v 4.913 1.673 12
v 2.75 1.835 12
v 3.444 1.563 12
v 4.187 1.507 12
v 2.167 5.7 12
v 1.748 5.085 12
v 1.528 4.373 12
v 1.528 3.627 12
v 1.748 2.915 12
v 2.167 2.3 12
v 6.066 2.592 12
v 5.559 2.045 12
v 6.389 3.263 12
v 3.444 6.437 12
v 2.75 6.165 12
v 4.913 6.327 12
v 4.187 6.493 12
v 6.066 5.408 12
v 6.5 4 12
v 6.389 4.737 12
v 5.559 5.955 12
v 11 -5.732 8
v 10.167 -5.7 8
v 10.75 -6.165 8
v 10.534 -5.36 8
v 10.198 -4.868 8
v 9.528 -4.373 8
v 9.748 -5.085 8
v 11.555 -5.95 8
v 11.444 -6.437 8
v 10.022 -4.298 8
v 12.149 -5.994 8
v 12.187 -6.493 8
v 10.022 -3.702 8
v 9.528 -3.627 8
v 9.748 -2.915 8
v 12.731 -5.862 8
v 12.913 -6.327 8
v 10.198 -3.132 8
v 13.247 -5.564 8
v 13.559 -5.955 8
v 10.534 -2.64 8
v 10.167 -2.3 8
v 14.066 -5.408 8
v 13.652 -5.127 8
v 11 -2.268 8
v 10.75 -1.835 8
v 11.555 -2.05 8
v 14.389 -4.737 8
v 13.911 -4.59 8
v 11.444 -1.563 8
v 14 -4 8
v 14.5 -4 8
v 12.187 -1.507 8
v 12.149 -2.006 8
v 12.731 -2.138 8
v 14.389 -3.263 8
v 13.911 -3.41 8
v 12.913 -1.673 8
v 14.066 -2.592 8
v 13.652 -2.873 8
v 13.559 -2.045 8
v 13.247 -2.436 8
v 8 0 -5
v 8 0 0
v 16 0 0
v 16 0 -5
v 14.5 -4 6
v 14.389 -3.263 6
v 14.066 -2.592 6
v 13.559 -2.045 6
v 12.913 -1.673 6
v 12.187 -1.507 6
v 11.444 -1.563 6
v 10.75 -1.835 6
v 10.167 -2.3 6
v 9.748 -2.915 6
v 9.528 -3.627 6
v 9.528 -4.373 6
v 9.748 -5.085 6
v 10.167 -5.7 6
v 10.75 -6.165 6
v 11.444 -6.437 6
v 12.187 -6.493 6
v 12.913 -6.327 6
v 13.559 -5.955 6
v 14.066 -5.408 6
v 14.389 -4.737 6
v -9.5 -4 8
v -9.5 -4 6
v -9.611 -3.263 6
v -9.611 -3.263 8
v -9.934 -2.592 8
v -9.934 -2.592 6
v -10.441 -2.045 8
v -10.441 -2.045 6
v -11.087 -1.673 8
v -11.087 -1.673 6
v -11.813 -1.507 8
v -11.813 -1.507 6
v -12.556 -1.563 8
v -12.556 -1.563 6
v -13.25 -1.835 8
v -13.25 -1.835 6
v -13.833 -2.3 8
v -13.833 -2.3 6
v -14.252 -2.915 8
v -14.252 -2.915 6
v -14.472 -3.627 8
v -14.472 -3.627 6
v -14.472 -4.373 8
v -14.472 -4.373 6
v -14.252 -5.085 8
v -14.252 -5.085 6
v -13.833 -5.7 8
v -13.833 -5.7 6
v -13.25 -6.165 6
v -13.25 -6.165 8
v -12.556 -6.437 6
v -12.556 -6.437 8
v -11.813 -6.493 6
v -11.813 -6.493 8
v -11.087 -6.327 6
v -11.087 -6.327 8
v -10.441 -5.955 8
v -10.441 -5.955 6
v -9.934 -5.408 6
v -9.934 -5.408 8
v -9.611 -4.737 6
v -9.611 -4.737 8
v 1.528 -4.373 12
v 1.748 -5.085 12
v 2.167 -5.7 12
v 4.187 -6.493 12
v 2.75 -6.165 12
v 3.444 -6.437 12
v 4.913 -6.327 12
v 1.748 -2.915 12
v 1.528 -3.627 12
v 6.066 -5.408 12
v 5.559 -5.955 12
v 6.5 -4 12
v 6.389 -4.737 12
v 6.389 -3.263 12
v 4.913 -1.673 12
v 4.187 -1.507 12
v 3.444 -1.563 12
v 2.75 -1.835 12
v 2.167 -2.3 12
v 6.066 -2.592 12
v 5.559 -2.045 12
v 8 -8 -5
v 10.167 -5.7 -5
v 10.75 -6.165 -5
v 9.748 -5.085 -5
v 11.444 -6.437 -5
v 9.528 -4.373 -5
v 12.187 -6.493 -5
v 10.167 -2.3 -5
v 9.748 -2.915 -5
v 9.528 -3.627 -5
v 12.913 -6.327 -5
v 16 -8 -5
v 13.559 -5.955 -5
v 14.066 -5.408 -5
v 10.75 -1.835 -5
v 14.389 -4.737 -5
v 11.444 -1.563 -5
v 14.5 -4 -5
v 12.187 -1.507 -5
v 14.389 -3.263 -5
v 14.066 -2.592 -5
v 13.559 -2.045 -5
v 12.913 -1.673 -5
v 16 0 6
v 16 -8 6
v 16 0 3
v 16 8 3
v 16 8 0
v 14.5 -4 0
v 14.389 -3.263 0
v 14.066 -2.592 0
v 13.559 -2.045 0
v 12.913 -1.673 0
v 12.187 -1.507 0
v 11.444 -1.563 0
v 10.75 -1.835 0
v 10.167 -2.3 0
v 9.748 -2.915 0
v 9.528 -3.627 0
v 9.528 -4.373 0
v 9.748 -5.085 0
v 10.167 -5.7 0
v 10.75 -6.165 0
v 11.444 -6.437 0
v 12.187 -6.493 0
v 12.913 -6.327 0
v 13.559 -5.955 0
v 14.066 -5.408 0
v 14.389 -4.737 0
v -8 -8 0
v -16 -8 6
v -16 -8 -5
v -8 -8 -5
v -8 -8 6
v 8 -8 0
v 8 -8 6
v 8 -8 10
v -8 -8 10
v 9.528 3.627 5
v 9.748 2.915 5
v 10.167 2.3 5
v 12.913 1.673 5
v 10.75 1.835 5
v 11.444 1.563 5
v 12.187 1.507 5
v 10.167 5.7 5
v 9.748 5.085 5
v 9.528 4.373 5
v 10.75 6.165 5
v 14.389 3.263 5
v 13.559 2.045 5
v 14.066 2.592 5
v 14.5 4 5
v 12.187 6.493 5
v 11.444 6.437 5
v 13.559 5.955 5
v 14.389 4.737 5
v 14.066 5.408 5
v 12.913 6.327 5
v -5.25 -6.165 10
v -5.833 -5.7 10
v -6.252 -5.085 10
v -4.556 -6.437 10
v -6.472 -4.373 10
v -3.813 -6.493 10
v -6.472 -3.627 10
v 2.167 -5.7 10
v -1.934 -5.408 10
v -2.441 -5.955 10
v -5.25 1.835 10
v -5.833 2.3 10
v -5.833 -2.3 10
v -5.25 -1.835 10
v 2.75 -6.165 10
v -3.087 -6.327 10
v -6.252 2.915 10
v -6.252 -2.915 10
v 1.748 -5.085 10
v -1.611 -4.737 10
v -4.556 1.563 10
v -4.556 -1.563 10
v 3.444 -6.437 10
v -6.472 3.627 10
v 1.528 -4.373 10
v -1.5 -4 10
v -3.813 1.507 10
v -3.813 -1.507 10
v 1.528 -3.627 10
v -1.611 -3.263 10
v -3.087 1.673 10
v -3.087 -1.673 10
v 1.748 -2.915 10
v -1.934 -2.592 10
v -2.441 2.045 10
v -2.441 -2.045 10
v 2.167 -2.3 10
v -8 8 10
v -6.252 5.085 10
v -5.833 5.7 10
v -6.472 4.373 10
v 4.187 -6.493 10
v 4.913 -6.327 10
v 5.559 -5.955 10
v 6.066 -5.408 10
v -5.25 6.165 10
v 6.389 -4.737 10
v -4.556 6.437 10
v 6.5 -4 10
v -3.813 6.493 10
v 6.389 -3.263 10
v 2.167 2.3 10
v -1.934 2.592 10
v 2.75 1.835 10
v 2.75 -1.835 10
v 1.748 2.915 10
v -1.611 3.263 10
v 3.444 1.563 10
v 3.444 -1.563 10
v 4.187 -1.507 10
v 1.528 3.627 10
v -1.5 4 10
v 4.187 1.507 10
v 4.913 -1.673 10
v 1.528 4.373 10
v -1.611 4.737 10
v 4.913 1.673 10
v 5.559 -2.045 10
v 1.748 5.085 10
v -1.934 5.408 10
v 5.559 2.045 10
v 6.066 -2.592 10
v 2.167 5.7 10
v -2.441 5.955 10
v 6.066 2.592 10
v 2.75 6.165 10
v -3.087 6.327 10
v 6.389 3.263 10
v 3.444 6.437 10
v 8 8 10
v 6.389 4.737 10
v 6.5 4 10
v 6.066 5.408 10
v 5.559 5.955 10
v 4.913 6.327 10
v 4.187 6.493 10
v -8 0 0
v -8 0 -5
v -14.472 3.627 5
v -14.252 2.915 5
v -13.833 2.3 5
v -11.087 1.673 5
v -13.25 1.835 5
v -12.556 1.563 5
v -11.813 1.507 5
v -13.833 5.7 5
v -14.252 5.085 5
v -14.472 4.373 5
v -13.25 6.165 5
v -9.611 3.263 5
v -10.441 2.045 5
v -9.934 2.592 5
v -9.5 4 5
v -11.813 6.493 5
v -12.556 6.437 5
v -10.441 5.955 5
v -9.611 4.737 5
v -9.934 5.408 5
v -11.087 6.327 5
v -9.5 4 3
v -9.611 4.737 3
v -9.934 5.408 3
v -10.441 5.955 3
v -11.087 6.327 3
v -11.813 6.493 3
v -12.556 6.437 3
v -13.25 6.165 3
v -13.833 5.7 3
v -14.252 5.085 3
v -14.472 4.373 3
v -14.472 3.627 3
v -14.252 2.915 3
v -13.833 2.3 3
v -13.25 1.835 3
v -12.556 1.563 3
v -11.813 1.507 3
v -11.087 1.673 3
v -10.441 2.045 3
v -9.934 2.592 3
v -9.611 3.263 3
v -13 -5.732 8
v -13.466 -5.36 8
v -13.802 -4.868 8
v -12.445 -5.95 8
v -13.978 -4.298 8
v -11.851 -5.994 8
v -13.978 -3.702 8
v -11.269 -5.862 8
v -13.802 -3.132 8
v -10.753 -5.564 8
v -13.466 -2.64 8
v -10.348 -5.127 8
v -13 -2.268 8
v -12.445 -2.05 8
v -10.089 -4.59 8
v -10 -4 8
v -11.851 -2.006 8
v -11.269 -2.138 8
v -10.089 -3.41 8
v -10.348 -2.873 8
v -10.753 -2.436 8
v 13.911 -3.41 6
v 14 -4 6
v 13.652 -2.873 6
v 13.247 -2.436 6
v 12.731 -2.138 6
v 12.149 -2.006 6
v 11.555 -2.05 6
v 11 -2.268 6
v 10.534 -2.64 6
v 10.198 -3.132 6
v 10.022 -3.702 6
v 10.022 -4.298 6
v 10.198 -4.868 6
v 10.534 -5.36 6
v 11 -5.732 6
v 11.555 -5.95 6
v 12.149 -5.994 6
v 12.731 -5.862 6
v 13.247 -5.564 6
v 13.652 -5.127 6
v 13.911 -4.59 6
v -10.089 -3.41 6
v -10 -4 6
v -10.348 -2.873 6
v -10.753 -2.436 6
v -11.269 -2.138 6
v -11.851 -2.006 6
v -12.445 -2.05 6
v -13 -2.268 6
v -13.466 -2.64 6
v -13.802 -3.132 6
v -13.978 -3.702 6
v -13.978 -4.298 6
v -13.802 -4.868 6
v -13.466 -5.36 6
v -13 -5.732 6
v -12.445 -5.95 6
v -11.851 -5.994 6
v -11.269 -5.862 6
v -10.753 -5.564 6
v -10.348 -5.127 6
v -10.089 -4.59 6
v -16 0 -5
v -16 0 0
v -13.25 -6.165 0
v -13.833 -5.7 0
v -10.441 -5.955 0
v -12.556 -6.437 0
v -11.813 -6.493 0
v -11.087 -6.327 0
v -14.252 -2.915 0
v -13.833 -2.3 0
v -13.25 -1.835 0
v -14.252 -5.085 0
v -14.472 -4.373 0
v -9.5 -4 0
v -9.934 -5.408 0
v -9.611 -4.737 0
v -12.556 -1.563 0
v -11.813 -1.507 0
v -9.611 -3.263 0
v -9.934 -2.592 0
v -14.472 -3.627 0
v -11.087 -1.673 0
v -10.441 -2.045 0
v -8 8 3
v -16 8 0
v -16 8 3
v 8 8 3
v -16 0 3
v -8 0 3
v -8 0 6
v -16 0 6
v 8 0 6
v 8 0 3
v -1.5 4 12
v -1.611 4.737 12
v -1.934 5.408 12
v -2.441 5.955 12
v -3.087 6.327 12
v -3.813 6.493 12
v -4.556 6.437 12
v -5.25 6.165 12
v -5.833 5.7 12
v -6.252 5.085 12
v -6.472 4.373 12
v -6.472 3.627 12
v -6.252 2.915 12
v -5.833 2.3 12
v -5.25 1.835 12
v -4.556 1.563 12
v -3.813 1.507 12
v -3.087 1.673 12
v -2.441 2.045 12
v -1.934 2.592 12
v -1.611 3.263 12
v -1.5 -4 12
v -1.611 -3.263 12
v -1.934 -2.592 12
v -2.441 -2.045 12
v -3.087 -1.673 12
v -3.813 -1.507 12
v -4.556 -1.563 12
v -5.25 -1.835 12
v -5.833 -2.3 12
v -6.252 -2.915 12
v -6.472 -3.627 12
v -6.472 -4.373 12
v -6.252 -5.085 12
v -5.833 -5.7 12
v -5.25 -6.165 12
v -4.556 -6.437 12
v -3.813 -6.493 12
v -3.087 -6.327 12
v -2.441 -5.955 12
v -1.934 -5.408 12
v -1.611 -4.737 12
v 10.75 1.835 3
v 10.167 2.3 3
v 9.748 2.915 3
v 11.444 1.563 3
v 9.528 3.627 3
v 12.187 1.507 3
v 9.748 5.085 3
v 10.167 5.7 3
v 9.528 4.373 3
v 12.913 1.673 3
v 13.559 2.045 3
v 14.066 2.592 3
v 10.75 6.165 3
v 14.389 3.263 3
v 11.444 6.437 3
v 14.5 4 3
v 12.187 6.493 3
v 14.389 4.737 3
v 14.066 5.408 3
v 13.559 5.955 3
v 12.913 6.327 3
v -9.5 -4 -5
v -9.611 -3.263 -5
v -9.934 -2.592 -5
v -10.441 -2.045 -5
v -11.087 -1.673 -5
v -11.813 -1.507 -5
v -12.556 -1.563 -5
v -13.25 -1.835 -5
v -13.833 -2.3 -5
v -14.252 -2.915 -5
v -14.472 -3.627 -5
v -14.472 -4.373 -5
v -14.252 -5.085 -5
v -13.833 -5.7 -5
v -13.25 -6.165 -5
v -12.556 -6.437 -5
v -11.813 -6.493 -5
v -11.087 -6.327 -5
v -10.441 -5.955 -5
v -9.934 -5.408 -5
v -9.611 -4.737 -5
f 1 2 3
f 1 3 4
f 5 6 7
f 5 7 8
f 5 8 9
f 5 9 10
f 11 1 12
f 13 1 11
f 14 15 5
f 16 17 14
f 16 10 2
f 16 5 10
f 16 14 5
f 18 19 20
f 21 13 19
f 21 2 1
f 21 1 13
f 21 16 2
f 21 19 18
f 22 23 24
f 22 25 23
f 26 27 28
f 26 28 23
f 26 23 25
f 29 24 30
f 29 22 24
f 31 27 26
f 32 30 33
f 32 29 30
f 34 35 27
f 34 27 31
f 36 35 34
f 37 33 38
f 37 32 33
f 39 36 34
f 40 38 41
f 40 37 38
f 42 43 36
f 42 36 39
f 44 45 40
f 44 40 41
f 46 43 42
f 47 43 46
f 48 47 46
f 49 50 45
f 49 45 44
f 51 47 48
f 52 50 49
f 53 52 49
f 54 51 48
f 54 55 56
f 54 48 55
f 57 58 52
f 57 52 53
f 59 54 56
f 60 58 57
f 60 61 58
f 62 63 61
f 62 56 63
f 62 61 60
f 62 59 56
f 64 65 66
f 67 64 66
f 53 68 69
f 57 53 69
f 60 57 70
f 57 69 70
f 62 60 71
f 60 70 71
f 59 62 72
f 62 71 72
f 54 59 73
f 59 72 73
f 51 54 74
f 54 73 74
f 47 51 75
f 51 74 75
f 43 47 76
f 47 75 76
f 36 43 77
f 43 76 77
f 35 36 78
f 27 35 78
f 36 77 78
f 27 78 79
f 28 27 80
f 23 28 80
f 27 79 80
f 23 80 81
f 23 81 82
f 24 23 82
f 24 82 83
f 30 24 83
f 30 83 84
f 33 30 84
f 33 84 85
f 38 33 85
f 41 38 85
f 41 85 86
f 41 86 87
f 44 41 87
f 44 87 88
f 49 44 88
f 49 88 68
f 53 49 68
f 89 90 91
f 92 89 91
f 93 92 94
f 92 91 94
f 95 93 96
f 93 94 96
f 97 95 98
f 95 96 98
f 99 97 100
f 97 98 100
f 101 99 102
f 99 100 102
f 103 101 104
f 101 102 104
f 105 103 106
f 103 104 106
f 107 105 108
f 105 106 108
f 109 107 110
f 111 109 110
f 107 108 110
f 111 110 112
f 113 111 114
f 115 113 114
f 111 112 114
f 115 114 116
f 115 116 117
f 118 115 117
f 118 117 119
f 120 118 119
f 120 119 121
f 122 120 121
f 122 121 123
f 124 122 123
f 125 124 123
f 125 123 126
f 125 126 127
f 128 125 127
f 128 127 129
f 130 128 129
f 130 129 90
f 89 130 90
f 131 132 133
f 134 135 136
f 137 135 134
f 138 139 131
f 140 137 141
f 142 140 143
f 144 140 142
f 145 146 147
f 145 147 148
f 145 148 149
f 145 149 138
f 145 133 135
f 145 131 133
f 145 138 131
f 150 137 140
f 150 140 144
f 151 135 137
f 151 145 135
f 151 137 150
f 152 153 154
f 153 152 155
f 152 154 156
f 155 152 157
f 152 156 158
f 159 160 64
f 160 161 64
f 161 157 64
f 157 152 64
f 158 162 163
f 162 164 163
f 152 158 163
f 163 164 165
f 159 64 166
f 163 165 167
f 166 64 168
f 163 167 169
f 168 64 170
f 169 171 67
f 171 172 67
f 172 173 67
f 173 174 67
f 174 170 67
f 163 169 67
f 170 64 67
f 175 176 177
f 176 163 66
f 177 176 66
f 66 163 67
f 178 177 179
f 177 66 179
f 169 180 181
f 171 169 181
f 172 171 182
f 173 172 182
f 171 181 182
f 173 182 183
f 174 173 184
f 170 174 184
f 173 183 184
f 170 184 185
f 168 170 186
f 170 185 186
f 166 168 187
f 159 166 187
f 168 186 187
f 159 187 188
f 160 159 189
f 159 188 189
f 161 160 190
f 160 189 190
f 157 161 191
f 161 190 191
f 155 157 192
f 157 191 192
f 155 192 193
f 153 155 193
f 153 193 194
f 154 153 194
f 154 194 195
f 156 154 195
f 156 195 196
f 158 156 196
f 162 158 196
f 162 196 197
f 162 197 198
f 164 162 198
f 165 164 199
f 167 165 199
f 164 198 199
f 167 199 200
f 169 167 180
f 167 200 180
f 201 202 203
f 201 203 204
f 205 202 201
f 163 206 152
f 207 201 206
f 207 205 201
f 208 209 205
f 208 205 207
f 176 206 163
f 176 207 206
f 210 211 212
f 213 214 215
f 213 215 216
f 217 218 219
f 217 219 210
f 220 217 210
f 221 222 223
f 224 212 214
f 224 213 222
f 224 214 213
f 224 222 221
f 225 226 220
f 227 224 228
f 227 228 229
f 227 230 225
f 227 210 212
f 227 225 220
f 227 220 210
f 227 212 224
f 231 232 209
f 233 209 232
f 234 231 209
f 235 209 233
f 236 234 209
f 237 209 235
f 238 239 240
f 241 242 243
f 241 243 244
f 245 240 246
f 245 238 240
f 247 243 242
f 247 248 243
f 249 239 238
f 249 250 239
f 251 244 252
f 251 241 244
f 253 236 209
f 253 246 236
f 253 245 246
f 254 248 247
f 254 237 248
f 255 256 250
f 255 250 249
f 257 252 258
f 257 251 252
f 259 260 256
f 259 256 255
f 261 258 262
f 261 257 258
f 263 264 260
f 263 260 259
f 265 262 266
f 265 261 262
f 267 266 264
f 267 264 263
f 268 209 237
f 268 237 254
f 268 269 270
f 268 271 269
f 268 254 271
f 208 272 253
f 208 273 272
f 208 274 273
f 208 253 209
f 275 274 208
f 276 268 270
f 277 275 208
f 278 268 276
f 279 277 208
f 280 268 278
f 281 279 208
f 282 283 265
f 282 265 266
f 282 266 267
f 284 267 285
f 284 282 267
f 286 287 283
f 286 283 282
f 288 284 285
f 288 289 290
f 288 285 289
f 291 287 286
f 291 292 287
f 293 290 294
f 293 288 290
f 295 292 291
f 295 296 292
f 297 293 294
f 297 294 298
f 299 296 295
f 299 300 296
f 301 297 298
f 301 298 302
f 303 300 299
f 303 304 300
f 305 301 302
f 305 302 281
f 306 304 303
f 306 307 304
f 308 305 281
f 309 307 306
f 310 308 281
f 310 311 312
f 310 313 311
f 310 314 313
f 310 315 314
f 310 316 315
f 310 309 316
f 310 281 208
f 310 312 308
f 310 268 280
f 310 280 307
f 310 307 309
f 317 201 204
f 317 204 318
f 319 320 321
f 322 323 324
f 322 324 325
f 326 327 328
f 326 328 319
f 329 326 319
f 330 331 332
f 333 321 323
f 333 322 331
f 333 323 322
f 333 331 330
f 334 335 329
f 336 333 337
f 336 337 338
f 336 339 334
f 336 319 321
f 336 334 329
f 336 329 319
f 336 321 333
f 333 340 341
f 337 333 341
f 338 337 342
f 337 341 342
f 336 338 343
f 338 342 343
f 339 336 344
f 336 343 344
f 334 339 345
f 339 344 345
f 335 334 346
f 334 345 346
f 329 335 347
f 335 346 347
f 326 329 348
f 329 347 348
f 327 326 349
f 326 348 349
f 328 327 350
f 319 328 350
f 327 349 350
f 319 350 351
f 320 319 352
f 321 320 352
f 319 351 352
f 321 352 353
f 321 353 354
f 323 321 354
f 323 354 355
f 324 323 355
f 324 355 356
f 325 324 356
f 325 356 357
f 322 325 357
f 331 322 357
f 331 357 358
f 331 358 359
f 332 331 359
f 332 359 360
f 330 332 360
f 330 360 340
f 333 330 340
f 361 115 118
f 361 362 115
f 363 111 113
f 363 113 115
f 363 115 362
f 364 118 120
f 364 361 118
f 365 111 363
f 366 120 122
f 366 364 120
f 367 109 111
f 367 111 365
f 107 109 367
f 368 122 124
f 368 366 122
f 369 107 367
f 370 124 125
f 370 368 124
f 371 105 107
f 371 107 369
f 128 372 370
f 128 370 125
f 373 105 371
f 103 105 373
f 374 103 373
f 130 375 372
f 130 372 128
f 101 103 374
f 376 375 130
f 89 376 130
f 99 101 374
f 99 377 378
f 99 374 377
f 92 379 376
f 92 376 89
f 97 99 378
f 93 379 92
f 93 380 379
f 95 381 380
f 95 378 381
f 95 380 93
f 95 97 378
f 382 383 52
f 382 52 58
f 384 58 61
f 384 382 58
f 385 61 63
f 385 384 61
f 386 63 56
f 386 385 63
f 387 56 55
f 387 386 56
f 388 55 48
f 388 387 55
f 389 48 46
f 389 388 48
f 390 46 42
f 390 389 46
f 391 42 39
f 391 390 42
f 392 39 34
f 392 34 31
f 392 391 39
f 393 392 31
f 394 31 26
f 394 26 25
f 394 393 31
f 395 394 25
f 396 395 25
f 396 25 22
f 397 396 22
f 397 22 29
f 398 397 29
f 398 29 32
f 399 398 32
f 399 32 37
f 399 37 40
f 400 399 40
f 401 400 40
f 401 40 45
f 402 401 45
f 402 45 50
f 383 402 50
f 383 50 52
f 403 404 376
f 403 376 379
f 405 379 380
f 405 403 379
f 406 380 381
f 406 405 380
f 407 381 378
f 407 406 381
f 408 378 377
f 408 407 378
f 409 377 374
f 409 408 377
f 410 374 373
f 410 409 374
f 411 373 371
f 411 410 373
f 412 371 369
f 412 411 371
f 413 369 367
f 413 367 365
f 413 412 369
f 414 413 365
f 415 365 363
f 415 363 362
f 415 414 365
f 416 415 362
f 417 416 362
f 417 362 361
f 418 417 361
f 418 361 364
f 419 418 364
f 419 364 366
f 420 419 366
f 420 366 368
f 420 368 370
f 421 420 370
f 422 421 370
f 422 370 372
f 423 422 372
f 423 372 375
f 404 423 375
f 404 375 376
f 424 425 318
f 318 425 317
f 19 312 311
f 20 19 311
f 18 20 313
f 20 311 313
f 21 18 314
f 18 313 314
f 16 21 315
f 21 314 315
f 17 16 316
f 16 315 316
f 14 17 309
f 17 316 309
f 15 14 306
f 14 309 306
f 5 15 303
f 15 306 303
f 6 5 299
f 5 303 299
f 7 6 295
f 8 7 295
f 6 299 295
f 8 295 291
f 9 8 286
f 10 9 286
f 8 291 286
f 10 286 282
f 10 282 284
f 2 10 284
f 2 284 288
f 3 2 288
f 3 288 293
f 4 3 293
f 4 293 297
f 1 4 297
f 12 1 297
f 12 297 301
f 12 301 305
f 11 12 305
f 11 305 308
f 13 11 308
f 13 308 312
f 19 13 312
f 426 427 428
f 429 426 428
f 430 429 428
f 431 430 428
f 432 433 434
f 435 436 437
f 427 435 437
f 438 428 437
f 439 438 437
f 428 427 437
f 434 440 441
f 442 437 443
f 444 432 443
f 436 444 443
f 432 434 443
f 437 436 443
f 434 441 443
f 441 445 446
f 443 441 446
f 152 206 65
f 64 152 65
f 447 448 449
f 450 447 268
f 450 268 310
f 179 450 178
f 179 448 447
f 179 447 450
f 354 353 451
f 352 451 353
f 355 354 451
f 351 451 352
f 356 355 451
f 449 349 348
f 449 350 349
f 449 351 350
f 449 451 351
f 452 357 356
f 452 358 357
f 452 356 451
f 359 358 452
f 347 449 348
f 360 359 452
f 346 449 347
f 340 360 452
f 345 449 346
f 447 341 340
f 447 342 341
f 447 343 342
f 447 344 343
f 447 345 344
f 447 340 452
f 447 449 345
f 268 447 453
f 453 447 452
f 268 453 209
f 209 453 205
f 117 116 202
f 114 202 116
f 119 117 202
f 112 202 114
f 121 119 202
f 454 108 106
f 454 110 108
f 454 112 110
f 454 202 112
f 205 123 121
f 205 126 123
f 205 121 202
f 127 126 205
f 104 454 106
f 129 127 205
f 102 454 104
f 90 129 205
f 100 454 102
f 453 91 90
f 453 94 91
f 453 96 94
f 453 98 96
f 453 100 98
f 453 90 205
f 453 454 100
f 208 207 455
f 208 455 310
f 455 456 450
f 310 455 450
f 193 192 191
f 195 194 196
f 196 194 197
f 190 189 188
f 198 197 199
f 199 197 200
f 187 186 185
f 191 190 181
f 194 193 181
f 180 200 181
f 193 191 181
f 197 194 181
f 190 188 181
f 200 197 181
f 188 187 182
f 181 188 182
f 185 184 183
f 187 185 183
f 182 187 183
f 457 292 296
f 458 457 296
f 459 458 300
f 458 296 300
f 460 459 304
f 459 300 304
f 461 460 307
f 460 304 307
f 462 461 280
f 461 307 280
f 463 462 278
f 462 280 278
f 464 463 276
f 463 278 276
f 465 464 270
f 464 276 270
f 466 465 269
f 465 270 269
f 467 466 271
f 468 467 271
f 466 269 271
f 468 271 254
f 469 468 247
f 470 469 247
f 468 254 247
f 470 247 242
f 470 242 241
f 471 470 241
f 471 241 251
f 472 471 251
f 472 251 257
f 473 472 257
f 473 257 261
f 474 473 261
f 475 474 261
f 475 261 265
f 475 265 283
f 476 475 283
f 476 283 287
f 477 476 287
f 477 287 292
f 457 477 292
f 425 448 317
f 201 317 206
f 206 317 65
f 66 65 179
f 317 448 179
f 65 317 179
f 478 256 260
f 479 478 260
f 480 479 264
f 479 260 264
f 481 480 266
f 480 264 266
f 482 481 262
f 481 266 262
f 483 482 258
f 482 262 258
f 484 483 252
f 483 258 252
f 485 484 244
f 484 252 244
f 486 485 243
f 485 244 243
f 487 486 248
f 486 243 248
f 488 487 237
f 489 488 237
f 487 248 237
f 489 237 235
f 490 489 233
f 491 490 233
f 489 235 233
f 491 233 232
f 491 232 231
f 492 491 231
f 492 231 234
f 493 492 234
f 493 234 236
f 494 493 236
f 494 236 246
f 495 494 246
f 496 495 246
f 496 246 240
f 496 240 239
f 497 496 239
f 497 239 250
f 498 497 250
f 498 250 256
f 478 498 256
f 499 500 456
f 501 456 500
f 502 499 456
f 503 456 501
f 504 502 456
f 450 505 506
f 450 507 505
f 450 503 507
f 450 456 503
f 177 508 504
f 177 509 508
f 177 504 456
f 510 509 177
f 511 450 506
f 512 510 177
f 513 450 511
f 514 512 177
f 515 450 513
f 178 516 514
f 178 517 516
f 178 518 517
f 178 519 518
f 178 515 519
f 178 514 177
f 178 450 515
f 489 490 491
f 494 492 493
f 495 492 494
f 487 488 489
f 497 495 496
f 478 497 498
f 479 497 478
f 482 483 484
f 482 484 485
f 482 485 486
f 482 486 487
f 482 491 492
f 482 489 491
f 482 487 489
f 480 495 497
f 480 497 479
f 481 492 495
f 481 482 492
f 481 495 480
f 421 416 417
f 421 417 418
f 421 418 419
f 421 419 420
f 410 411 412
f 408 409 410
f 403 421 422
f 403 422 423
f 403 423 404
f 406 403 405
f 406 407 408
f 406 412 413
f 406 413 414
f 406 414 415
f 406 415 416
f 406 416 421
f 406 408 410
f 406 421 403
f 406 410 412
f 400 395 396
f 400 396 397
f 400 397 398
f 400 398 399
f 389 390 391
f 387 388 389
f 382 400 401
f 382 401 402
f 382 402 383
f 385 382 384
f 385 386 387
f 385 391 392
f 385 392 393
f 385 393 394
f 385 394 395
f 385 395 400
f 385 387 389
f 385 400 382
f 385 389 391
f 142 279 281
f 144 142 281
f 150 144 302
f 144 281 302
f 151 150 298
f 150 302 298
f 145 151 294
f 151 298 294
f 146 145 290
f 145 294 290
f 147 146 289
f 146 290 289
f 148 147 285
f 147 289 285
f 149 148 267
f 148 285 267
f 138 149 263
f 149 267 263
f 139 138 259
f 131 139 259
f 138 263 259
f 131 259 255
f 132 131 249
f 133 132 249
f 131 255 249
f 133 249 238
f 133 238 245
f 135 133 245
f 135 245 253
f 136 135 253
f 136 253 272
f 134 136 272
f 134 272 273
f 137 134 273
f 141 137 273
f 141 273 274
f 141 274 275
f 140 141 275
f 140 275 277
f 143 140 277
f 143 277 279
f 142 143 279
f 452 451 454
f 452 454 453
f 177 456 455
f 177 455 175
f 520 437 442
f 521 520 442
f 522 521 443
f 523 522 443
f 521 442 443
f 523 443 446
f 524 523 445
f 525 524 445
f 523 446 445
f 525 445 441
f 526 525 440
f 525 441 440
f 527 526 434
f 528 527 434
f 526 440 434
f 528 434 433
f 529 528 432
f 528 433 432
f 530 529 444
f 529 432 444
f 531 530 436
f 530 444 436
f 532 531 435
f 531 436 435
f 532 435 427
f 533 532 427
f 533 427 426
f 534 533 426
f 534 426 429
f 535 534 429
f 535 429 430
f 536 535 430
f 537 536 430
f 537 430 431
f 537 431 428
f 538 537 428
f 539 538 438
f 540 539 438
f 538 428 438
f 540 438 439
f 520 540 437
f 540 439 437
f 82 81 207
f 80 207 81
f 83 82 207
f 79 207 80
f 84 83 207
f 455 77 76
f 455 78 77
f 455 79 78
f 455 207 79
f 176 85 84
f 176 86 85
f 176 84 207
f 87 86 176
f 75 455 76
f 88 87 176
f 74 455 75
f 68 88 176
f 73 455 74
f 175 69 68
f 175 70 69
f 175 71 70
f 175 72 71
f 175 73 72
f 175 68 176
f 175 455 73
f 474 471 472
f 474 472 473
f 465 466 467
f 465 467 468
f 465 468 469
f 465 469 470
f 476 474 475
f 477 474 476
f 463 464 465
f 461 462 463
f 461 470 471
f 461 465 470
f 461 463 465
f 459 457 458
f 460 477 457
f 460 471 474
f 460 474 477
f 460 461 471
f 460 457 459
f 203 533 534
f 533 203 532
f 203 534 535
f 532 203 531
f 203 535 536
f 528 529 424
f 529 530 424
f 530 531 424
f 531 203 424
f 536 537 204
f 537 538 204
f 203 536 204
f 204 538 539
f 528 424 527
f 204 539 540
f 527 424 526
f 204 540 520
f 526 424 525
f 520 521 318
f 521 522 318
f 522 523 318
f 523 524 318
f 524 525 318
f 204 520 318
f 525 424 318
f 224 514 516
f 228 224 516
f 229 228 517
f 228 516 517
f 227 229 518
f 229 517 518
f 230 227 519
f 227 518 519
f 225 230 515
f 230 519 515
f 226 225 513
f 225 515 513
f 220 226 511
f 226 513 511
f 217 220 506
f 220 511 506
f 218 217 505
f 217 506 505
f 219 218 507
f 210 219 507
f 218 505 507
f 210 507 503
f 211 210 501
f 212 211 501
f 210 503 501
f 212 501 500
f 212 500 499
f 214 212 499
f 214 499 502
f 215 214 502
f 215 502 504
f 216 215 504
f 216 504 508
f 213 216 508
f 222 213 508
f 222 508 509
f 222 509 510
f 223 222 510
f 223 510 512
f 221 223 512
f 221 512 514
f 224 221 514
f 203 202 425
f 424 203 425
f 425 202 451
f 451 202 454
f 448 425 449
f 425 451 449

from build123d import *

# Parameters (mm, degrees)
F0_W     = 8
F0_H     = 8
F0_R     = 2.5
F1_DEPTH = 10
F2_DEPTH = 12
F3_DEPTH = 3
F4_DEPTH = 5
F5_DEPTH = 6
F0_R_2   = 2
F6_DEPTH = 8
F7_DEPTH = 6
F8_DEPTH = 5


with BuildPart() as f1:
    # F0 (on Top) → F1 (new body)
    with BuildSketch(Plane.XY):
        with Locations((-4, 4)):
            Rectangle(F0_W, F0_H)
        with Locations((-4, 4)):
            Circle(F0_R, mode=Mode.SUBTRACT)
        with Locations((4, 4)):
            Rectangle(F0_W, F0_H)
        with Locations((4, 4)):
            Circle(F0_R, mode=Mode.SUBTRACT)
        with Locations((-4, -4)):
            Rectangle(F0_W, F0_H)
        with Locations((-4, -4)):
            Circle(F0_R, mode=Mode.SUBTRACT)
        with Locations((4, -4)):
            Rectangle(F0_W, F0_H)
        with Locations((4, -4)):
            Circle(F0_R, mode=Mode.SUBTRACT)
    extrude(amount=F1_DEPTH)

    # F0 (on Top) → F2 (join)
    with BuildSketch(Plane.XY):
        with Locations((-4, 4)):
            Circle(F0_R)
        with Locations((4, 4)):
            Circle(F0_R)
        with Locations((-4, -4)):
            Circle(F0_R)
        with Locations((4, -4)):
            Circle(F0_R)
    extrude(amount=F2_DEPTH)

    # F0 (on Top) → F3 (join)
    with BuildSketch(Plane.XY):
        with Locations((-12, 4)):
            Rectangle(F0_W, F0_H)
        with Locations((-12, 4)):
            Circle(F0_R, mode=Mode.SUBTRACT)
        with Locations((12, 4)):
            Rectangle(F0_W, F0_H)
        with Locations((12, 4)):
            Circle(F0_R, mode=Mode.SUBTRACT)
    extrude(amount=F3_DEPTH)

    # F0 (on Top) → F4 (join)
    with BuildSketch(Plane.XY):
        with Locations((-12, 4)):
            Circle(F0_R)
        with Locations((12, 4)):
            Circle(F0_R)
    extrude(amount=F4_DEPTH)

    # F0 (on Top) → F5 (join)
    with BuildSketch(Plane.XY):
        with Locations((-12, -4)):
            Rectangle(F0_W, F0_H)
        with Locations((-12, -4)):
            Circle(F0_R, mode=Mode.SUBTRACT)
        with Locations((12, -4)):
            Rectangle(F0_W, F0_H)
        with Locations((12, -4)):
            Circle(F0_R, mode=Mode.SUBTRACT)
    extrude(amount=F5_DEPTH)

    # F0 (on Top) → F6 (join)
    with BuildSketch(Plane.XY):
        with Locations((-12, -4)):
            Circle(F0_R)
        with Locations((-12, -4)):
            Circle(F0_R_2, mode=Mode.SUBTRACT)
        with Locations((12, -4)):
            Circle(F0_R)
        with Locations((12, -4)):
            Circle(F0_R_2, mode=Mode.SUBTRACT)
    extrude(amount=F6_DEPTH)

    # F0 (on Top) → F7 (join)
    with BuildSketch(Plane.XY):
        with Locations((-12, -4)):
            Circle(F0_R_2)
        with Locations((12, -4)):
            Circle(F0_R_2)
    extrude(amount=F7_DEPTH)

    # F0 (on Top) → F8 (join)
    with BuildSketch(Plane.XY):
        with Locations((-12, -4)):
            Rectangle(F0_W, F0_H)
        with Locations((-12, -4)):
            Circle(F0_R, mode=Mode.SUBTRACT)
        with Locations((12, -4)):
            Rectangle(F0_W, F0_H)
        with Locations((12, -4)):
            Circle(F0_R, mode=Mode.SUBTRACT)
    extrude(amount=-F8_DEPTH)


solid = f1.part
